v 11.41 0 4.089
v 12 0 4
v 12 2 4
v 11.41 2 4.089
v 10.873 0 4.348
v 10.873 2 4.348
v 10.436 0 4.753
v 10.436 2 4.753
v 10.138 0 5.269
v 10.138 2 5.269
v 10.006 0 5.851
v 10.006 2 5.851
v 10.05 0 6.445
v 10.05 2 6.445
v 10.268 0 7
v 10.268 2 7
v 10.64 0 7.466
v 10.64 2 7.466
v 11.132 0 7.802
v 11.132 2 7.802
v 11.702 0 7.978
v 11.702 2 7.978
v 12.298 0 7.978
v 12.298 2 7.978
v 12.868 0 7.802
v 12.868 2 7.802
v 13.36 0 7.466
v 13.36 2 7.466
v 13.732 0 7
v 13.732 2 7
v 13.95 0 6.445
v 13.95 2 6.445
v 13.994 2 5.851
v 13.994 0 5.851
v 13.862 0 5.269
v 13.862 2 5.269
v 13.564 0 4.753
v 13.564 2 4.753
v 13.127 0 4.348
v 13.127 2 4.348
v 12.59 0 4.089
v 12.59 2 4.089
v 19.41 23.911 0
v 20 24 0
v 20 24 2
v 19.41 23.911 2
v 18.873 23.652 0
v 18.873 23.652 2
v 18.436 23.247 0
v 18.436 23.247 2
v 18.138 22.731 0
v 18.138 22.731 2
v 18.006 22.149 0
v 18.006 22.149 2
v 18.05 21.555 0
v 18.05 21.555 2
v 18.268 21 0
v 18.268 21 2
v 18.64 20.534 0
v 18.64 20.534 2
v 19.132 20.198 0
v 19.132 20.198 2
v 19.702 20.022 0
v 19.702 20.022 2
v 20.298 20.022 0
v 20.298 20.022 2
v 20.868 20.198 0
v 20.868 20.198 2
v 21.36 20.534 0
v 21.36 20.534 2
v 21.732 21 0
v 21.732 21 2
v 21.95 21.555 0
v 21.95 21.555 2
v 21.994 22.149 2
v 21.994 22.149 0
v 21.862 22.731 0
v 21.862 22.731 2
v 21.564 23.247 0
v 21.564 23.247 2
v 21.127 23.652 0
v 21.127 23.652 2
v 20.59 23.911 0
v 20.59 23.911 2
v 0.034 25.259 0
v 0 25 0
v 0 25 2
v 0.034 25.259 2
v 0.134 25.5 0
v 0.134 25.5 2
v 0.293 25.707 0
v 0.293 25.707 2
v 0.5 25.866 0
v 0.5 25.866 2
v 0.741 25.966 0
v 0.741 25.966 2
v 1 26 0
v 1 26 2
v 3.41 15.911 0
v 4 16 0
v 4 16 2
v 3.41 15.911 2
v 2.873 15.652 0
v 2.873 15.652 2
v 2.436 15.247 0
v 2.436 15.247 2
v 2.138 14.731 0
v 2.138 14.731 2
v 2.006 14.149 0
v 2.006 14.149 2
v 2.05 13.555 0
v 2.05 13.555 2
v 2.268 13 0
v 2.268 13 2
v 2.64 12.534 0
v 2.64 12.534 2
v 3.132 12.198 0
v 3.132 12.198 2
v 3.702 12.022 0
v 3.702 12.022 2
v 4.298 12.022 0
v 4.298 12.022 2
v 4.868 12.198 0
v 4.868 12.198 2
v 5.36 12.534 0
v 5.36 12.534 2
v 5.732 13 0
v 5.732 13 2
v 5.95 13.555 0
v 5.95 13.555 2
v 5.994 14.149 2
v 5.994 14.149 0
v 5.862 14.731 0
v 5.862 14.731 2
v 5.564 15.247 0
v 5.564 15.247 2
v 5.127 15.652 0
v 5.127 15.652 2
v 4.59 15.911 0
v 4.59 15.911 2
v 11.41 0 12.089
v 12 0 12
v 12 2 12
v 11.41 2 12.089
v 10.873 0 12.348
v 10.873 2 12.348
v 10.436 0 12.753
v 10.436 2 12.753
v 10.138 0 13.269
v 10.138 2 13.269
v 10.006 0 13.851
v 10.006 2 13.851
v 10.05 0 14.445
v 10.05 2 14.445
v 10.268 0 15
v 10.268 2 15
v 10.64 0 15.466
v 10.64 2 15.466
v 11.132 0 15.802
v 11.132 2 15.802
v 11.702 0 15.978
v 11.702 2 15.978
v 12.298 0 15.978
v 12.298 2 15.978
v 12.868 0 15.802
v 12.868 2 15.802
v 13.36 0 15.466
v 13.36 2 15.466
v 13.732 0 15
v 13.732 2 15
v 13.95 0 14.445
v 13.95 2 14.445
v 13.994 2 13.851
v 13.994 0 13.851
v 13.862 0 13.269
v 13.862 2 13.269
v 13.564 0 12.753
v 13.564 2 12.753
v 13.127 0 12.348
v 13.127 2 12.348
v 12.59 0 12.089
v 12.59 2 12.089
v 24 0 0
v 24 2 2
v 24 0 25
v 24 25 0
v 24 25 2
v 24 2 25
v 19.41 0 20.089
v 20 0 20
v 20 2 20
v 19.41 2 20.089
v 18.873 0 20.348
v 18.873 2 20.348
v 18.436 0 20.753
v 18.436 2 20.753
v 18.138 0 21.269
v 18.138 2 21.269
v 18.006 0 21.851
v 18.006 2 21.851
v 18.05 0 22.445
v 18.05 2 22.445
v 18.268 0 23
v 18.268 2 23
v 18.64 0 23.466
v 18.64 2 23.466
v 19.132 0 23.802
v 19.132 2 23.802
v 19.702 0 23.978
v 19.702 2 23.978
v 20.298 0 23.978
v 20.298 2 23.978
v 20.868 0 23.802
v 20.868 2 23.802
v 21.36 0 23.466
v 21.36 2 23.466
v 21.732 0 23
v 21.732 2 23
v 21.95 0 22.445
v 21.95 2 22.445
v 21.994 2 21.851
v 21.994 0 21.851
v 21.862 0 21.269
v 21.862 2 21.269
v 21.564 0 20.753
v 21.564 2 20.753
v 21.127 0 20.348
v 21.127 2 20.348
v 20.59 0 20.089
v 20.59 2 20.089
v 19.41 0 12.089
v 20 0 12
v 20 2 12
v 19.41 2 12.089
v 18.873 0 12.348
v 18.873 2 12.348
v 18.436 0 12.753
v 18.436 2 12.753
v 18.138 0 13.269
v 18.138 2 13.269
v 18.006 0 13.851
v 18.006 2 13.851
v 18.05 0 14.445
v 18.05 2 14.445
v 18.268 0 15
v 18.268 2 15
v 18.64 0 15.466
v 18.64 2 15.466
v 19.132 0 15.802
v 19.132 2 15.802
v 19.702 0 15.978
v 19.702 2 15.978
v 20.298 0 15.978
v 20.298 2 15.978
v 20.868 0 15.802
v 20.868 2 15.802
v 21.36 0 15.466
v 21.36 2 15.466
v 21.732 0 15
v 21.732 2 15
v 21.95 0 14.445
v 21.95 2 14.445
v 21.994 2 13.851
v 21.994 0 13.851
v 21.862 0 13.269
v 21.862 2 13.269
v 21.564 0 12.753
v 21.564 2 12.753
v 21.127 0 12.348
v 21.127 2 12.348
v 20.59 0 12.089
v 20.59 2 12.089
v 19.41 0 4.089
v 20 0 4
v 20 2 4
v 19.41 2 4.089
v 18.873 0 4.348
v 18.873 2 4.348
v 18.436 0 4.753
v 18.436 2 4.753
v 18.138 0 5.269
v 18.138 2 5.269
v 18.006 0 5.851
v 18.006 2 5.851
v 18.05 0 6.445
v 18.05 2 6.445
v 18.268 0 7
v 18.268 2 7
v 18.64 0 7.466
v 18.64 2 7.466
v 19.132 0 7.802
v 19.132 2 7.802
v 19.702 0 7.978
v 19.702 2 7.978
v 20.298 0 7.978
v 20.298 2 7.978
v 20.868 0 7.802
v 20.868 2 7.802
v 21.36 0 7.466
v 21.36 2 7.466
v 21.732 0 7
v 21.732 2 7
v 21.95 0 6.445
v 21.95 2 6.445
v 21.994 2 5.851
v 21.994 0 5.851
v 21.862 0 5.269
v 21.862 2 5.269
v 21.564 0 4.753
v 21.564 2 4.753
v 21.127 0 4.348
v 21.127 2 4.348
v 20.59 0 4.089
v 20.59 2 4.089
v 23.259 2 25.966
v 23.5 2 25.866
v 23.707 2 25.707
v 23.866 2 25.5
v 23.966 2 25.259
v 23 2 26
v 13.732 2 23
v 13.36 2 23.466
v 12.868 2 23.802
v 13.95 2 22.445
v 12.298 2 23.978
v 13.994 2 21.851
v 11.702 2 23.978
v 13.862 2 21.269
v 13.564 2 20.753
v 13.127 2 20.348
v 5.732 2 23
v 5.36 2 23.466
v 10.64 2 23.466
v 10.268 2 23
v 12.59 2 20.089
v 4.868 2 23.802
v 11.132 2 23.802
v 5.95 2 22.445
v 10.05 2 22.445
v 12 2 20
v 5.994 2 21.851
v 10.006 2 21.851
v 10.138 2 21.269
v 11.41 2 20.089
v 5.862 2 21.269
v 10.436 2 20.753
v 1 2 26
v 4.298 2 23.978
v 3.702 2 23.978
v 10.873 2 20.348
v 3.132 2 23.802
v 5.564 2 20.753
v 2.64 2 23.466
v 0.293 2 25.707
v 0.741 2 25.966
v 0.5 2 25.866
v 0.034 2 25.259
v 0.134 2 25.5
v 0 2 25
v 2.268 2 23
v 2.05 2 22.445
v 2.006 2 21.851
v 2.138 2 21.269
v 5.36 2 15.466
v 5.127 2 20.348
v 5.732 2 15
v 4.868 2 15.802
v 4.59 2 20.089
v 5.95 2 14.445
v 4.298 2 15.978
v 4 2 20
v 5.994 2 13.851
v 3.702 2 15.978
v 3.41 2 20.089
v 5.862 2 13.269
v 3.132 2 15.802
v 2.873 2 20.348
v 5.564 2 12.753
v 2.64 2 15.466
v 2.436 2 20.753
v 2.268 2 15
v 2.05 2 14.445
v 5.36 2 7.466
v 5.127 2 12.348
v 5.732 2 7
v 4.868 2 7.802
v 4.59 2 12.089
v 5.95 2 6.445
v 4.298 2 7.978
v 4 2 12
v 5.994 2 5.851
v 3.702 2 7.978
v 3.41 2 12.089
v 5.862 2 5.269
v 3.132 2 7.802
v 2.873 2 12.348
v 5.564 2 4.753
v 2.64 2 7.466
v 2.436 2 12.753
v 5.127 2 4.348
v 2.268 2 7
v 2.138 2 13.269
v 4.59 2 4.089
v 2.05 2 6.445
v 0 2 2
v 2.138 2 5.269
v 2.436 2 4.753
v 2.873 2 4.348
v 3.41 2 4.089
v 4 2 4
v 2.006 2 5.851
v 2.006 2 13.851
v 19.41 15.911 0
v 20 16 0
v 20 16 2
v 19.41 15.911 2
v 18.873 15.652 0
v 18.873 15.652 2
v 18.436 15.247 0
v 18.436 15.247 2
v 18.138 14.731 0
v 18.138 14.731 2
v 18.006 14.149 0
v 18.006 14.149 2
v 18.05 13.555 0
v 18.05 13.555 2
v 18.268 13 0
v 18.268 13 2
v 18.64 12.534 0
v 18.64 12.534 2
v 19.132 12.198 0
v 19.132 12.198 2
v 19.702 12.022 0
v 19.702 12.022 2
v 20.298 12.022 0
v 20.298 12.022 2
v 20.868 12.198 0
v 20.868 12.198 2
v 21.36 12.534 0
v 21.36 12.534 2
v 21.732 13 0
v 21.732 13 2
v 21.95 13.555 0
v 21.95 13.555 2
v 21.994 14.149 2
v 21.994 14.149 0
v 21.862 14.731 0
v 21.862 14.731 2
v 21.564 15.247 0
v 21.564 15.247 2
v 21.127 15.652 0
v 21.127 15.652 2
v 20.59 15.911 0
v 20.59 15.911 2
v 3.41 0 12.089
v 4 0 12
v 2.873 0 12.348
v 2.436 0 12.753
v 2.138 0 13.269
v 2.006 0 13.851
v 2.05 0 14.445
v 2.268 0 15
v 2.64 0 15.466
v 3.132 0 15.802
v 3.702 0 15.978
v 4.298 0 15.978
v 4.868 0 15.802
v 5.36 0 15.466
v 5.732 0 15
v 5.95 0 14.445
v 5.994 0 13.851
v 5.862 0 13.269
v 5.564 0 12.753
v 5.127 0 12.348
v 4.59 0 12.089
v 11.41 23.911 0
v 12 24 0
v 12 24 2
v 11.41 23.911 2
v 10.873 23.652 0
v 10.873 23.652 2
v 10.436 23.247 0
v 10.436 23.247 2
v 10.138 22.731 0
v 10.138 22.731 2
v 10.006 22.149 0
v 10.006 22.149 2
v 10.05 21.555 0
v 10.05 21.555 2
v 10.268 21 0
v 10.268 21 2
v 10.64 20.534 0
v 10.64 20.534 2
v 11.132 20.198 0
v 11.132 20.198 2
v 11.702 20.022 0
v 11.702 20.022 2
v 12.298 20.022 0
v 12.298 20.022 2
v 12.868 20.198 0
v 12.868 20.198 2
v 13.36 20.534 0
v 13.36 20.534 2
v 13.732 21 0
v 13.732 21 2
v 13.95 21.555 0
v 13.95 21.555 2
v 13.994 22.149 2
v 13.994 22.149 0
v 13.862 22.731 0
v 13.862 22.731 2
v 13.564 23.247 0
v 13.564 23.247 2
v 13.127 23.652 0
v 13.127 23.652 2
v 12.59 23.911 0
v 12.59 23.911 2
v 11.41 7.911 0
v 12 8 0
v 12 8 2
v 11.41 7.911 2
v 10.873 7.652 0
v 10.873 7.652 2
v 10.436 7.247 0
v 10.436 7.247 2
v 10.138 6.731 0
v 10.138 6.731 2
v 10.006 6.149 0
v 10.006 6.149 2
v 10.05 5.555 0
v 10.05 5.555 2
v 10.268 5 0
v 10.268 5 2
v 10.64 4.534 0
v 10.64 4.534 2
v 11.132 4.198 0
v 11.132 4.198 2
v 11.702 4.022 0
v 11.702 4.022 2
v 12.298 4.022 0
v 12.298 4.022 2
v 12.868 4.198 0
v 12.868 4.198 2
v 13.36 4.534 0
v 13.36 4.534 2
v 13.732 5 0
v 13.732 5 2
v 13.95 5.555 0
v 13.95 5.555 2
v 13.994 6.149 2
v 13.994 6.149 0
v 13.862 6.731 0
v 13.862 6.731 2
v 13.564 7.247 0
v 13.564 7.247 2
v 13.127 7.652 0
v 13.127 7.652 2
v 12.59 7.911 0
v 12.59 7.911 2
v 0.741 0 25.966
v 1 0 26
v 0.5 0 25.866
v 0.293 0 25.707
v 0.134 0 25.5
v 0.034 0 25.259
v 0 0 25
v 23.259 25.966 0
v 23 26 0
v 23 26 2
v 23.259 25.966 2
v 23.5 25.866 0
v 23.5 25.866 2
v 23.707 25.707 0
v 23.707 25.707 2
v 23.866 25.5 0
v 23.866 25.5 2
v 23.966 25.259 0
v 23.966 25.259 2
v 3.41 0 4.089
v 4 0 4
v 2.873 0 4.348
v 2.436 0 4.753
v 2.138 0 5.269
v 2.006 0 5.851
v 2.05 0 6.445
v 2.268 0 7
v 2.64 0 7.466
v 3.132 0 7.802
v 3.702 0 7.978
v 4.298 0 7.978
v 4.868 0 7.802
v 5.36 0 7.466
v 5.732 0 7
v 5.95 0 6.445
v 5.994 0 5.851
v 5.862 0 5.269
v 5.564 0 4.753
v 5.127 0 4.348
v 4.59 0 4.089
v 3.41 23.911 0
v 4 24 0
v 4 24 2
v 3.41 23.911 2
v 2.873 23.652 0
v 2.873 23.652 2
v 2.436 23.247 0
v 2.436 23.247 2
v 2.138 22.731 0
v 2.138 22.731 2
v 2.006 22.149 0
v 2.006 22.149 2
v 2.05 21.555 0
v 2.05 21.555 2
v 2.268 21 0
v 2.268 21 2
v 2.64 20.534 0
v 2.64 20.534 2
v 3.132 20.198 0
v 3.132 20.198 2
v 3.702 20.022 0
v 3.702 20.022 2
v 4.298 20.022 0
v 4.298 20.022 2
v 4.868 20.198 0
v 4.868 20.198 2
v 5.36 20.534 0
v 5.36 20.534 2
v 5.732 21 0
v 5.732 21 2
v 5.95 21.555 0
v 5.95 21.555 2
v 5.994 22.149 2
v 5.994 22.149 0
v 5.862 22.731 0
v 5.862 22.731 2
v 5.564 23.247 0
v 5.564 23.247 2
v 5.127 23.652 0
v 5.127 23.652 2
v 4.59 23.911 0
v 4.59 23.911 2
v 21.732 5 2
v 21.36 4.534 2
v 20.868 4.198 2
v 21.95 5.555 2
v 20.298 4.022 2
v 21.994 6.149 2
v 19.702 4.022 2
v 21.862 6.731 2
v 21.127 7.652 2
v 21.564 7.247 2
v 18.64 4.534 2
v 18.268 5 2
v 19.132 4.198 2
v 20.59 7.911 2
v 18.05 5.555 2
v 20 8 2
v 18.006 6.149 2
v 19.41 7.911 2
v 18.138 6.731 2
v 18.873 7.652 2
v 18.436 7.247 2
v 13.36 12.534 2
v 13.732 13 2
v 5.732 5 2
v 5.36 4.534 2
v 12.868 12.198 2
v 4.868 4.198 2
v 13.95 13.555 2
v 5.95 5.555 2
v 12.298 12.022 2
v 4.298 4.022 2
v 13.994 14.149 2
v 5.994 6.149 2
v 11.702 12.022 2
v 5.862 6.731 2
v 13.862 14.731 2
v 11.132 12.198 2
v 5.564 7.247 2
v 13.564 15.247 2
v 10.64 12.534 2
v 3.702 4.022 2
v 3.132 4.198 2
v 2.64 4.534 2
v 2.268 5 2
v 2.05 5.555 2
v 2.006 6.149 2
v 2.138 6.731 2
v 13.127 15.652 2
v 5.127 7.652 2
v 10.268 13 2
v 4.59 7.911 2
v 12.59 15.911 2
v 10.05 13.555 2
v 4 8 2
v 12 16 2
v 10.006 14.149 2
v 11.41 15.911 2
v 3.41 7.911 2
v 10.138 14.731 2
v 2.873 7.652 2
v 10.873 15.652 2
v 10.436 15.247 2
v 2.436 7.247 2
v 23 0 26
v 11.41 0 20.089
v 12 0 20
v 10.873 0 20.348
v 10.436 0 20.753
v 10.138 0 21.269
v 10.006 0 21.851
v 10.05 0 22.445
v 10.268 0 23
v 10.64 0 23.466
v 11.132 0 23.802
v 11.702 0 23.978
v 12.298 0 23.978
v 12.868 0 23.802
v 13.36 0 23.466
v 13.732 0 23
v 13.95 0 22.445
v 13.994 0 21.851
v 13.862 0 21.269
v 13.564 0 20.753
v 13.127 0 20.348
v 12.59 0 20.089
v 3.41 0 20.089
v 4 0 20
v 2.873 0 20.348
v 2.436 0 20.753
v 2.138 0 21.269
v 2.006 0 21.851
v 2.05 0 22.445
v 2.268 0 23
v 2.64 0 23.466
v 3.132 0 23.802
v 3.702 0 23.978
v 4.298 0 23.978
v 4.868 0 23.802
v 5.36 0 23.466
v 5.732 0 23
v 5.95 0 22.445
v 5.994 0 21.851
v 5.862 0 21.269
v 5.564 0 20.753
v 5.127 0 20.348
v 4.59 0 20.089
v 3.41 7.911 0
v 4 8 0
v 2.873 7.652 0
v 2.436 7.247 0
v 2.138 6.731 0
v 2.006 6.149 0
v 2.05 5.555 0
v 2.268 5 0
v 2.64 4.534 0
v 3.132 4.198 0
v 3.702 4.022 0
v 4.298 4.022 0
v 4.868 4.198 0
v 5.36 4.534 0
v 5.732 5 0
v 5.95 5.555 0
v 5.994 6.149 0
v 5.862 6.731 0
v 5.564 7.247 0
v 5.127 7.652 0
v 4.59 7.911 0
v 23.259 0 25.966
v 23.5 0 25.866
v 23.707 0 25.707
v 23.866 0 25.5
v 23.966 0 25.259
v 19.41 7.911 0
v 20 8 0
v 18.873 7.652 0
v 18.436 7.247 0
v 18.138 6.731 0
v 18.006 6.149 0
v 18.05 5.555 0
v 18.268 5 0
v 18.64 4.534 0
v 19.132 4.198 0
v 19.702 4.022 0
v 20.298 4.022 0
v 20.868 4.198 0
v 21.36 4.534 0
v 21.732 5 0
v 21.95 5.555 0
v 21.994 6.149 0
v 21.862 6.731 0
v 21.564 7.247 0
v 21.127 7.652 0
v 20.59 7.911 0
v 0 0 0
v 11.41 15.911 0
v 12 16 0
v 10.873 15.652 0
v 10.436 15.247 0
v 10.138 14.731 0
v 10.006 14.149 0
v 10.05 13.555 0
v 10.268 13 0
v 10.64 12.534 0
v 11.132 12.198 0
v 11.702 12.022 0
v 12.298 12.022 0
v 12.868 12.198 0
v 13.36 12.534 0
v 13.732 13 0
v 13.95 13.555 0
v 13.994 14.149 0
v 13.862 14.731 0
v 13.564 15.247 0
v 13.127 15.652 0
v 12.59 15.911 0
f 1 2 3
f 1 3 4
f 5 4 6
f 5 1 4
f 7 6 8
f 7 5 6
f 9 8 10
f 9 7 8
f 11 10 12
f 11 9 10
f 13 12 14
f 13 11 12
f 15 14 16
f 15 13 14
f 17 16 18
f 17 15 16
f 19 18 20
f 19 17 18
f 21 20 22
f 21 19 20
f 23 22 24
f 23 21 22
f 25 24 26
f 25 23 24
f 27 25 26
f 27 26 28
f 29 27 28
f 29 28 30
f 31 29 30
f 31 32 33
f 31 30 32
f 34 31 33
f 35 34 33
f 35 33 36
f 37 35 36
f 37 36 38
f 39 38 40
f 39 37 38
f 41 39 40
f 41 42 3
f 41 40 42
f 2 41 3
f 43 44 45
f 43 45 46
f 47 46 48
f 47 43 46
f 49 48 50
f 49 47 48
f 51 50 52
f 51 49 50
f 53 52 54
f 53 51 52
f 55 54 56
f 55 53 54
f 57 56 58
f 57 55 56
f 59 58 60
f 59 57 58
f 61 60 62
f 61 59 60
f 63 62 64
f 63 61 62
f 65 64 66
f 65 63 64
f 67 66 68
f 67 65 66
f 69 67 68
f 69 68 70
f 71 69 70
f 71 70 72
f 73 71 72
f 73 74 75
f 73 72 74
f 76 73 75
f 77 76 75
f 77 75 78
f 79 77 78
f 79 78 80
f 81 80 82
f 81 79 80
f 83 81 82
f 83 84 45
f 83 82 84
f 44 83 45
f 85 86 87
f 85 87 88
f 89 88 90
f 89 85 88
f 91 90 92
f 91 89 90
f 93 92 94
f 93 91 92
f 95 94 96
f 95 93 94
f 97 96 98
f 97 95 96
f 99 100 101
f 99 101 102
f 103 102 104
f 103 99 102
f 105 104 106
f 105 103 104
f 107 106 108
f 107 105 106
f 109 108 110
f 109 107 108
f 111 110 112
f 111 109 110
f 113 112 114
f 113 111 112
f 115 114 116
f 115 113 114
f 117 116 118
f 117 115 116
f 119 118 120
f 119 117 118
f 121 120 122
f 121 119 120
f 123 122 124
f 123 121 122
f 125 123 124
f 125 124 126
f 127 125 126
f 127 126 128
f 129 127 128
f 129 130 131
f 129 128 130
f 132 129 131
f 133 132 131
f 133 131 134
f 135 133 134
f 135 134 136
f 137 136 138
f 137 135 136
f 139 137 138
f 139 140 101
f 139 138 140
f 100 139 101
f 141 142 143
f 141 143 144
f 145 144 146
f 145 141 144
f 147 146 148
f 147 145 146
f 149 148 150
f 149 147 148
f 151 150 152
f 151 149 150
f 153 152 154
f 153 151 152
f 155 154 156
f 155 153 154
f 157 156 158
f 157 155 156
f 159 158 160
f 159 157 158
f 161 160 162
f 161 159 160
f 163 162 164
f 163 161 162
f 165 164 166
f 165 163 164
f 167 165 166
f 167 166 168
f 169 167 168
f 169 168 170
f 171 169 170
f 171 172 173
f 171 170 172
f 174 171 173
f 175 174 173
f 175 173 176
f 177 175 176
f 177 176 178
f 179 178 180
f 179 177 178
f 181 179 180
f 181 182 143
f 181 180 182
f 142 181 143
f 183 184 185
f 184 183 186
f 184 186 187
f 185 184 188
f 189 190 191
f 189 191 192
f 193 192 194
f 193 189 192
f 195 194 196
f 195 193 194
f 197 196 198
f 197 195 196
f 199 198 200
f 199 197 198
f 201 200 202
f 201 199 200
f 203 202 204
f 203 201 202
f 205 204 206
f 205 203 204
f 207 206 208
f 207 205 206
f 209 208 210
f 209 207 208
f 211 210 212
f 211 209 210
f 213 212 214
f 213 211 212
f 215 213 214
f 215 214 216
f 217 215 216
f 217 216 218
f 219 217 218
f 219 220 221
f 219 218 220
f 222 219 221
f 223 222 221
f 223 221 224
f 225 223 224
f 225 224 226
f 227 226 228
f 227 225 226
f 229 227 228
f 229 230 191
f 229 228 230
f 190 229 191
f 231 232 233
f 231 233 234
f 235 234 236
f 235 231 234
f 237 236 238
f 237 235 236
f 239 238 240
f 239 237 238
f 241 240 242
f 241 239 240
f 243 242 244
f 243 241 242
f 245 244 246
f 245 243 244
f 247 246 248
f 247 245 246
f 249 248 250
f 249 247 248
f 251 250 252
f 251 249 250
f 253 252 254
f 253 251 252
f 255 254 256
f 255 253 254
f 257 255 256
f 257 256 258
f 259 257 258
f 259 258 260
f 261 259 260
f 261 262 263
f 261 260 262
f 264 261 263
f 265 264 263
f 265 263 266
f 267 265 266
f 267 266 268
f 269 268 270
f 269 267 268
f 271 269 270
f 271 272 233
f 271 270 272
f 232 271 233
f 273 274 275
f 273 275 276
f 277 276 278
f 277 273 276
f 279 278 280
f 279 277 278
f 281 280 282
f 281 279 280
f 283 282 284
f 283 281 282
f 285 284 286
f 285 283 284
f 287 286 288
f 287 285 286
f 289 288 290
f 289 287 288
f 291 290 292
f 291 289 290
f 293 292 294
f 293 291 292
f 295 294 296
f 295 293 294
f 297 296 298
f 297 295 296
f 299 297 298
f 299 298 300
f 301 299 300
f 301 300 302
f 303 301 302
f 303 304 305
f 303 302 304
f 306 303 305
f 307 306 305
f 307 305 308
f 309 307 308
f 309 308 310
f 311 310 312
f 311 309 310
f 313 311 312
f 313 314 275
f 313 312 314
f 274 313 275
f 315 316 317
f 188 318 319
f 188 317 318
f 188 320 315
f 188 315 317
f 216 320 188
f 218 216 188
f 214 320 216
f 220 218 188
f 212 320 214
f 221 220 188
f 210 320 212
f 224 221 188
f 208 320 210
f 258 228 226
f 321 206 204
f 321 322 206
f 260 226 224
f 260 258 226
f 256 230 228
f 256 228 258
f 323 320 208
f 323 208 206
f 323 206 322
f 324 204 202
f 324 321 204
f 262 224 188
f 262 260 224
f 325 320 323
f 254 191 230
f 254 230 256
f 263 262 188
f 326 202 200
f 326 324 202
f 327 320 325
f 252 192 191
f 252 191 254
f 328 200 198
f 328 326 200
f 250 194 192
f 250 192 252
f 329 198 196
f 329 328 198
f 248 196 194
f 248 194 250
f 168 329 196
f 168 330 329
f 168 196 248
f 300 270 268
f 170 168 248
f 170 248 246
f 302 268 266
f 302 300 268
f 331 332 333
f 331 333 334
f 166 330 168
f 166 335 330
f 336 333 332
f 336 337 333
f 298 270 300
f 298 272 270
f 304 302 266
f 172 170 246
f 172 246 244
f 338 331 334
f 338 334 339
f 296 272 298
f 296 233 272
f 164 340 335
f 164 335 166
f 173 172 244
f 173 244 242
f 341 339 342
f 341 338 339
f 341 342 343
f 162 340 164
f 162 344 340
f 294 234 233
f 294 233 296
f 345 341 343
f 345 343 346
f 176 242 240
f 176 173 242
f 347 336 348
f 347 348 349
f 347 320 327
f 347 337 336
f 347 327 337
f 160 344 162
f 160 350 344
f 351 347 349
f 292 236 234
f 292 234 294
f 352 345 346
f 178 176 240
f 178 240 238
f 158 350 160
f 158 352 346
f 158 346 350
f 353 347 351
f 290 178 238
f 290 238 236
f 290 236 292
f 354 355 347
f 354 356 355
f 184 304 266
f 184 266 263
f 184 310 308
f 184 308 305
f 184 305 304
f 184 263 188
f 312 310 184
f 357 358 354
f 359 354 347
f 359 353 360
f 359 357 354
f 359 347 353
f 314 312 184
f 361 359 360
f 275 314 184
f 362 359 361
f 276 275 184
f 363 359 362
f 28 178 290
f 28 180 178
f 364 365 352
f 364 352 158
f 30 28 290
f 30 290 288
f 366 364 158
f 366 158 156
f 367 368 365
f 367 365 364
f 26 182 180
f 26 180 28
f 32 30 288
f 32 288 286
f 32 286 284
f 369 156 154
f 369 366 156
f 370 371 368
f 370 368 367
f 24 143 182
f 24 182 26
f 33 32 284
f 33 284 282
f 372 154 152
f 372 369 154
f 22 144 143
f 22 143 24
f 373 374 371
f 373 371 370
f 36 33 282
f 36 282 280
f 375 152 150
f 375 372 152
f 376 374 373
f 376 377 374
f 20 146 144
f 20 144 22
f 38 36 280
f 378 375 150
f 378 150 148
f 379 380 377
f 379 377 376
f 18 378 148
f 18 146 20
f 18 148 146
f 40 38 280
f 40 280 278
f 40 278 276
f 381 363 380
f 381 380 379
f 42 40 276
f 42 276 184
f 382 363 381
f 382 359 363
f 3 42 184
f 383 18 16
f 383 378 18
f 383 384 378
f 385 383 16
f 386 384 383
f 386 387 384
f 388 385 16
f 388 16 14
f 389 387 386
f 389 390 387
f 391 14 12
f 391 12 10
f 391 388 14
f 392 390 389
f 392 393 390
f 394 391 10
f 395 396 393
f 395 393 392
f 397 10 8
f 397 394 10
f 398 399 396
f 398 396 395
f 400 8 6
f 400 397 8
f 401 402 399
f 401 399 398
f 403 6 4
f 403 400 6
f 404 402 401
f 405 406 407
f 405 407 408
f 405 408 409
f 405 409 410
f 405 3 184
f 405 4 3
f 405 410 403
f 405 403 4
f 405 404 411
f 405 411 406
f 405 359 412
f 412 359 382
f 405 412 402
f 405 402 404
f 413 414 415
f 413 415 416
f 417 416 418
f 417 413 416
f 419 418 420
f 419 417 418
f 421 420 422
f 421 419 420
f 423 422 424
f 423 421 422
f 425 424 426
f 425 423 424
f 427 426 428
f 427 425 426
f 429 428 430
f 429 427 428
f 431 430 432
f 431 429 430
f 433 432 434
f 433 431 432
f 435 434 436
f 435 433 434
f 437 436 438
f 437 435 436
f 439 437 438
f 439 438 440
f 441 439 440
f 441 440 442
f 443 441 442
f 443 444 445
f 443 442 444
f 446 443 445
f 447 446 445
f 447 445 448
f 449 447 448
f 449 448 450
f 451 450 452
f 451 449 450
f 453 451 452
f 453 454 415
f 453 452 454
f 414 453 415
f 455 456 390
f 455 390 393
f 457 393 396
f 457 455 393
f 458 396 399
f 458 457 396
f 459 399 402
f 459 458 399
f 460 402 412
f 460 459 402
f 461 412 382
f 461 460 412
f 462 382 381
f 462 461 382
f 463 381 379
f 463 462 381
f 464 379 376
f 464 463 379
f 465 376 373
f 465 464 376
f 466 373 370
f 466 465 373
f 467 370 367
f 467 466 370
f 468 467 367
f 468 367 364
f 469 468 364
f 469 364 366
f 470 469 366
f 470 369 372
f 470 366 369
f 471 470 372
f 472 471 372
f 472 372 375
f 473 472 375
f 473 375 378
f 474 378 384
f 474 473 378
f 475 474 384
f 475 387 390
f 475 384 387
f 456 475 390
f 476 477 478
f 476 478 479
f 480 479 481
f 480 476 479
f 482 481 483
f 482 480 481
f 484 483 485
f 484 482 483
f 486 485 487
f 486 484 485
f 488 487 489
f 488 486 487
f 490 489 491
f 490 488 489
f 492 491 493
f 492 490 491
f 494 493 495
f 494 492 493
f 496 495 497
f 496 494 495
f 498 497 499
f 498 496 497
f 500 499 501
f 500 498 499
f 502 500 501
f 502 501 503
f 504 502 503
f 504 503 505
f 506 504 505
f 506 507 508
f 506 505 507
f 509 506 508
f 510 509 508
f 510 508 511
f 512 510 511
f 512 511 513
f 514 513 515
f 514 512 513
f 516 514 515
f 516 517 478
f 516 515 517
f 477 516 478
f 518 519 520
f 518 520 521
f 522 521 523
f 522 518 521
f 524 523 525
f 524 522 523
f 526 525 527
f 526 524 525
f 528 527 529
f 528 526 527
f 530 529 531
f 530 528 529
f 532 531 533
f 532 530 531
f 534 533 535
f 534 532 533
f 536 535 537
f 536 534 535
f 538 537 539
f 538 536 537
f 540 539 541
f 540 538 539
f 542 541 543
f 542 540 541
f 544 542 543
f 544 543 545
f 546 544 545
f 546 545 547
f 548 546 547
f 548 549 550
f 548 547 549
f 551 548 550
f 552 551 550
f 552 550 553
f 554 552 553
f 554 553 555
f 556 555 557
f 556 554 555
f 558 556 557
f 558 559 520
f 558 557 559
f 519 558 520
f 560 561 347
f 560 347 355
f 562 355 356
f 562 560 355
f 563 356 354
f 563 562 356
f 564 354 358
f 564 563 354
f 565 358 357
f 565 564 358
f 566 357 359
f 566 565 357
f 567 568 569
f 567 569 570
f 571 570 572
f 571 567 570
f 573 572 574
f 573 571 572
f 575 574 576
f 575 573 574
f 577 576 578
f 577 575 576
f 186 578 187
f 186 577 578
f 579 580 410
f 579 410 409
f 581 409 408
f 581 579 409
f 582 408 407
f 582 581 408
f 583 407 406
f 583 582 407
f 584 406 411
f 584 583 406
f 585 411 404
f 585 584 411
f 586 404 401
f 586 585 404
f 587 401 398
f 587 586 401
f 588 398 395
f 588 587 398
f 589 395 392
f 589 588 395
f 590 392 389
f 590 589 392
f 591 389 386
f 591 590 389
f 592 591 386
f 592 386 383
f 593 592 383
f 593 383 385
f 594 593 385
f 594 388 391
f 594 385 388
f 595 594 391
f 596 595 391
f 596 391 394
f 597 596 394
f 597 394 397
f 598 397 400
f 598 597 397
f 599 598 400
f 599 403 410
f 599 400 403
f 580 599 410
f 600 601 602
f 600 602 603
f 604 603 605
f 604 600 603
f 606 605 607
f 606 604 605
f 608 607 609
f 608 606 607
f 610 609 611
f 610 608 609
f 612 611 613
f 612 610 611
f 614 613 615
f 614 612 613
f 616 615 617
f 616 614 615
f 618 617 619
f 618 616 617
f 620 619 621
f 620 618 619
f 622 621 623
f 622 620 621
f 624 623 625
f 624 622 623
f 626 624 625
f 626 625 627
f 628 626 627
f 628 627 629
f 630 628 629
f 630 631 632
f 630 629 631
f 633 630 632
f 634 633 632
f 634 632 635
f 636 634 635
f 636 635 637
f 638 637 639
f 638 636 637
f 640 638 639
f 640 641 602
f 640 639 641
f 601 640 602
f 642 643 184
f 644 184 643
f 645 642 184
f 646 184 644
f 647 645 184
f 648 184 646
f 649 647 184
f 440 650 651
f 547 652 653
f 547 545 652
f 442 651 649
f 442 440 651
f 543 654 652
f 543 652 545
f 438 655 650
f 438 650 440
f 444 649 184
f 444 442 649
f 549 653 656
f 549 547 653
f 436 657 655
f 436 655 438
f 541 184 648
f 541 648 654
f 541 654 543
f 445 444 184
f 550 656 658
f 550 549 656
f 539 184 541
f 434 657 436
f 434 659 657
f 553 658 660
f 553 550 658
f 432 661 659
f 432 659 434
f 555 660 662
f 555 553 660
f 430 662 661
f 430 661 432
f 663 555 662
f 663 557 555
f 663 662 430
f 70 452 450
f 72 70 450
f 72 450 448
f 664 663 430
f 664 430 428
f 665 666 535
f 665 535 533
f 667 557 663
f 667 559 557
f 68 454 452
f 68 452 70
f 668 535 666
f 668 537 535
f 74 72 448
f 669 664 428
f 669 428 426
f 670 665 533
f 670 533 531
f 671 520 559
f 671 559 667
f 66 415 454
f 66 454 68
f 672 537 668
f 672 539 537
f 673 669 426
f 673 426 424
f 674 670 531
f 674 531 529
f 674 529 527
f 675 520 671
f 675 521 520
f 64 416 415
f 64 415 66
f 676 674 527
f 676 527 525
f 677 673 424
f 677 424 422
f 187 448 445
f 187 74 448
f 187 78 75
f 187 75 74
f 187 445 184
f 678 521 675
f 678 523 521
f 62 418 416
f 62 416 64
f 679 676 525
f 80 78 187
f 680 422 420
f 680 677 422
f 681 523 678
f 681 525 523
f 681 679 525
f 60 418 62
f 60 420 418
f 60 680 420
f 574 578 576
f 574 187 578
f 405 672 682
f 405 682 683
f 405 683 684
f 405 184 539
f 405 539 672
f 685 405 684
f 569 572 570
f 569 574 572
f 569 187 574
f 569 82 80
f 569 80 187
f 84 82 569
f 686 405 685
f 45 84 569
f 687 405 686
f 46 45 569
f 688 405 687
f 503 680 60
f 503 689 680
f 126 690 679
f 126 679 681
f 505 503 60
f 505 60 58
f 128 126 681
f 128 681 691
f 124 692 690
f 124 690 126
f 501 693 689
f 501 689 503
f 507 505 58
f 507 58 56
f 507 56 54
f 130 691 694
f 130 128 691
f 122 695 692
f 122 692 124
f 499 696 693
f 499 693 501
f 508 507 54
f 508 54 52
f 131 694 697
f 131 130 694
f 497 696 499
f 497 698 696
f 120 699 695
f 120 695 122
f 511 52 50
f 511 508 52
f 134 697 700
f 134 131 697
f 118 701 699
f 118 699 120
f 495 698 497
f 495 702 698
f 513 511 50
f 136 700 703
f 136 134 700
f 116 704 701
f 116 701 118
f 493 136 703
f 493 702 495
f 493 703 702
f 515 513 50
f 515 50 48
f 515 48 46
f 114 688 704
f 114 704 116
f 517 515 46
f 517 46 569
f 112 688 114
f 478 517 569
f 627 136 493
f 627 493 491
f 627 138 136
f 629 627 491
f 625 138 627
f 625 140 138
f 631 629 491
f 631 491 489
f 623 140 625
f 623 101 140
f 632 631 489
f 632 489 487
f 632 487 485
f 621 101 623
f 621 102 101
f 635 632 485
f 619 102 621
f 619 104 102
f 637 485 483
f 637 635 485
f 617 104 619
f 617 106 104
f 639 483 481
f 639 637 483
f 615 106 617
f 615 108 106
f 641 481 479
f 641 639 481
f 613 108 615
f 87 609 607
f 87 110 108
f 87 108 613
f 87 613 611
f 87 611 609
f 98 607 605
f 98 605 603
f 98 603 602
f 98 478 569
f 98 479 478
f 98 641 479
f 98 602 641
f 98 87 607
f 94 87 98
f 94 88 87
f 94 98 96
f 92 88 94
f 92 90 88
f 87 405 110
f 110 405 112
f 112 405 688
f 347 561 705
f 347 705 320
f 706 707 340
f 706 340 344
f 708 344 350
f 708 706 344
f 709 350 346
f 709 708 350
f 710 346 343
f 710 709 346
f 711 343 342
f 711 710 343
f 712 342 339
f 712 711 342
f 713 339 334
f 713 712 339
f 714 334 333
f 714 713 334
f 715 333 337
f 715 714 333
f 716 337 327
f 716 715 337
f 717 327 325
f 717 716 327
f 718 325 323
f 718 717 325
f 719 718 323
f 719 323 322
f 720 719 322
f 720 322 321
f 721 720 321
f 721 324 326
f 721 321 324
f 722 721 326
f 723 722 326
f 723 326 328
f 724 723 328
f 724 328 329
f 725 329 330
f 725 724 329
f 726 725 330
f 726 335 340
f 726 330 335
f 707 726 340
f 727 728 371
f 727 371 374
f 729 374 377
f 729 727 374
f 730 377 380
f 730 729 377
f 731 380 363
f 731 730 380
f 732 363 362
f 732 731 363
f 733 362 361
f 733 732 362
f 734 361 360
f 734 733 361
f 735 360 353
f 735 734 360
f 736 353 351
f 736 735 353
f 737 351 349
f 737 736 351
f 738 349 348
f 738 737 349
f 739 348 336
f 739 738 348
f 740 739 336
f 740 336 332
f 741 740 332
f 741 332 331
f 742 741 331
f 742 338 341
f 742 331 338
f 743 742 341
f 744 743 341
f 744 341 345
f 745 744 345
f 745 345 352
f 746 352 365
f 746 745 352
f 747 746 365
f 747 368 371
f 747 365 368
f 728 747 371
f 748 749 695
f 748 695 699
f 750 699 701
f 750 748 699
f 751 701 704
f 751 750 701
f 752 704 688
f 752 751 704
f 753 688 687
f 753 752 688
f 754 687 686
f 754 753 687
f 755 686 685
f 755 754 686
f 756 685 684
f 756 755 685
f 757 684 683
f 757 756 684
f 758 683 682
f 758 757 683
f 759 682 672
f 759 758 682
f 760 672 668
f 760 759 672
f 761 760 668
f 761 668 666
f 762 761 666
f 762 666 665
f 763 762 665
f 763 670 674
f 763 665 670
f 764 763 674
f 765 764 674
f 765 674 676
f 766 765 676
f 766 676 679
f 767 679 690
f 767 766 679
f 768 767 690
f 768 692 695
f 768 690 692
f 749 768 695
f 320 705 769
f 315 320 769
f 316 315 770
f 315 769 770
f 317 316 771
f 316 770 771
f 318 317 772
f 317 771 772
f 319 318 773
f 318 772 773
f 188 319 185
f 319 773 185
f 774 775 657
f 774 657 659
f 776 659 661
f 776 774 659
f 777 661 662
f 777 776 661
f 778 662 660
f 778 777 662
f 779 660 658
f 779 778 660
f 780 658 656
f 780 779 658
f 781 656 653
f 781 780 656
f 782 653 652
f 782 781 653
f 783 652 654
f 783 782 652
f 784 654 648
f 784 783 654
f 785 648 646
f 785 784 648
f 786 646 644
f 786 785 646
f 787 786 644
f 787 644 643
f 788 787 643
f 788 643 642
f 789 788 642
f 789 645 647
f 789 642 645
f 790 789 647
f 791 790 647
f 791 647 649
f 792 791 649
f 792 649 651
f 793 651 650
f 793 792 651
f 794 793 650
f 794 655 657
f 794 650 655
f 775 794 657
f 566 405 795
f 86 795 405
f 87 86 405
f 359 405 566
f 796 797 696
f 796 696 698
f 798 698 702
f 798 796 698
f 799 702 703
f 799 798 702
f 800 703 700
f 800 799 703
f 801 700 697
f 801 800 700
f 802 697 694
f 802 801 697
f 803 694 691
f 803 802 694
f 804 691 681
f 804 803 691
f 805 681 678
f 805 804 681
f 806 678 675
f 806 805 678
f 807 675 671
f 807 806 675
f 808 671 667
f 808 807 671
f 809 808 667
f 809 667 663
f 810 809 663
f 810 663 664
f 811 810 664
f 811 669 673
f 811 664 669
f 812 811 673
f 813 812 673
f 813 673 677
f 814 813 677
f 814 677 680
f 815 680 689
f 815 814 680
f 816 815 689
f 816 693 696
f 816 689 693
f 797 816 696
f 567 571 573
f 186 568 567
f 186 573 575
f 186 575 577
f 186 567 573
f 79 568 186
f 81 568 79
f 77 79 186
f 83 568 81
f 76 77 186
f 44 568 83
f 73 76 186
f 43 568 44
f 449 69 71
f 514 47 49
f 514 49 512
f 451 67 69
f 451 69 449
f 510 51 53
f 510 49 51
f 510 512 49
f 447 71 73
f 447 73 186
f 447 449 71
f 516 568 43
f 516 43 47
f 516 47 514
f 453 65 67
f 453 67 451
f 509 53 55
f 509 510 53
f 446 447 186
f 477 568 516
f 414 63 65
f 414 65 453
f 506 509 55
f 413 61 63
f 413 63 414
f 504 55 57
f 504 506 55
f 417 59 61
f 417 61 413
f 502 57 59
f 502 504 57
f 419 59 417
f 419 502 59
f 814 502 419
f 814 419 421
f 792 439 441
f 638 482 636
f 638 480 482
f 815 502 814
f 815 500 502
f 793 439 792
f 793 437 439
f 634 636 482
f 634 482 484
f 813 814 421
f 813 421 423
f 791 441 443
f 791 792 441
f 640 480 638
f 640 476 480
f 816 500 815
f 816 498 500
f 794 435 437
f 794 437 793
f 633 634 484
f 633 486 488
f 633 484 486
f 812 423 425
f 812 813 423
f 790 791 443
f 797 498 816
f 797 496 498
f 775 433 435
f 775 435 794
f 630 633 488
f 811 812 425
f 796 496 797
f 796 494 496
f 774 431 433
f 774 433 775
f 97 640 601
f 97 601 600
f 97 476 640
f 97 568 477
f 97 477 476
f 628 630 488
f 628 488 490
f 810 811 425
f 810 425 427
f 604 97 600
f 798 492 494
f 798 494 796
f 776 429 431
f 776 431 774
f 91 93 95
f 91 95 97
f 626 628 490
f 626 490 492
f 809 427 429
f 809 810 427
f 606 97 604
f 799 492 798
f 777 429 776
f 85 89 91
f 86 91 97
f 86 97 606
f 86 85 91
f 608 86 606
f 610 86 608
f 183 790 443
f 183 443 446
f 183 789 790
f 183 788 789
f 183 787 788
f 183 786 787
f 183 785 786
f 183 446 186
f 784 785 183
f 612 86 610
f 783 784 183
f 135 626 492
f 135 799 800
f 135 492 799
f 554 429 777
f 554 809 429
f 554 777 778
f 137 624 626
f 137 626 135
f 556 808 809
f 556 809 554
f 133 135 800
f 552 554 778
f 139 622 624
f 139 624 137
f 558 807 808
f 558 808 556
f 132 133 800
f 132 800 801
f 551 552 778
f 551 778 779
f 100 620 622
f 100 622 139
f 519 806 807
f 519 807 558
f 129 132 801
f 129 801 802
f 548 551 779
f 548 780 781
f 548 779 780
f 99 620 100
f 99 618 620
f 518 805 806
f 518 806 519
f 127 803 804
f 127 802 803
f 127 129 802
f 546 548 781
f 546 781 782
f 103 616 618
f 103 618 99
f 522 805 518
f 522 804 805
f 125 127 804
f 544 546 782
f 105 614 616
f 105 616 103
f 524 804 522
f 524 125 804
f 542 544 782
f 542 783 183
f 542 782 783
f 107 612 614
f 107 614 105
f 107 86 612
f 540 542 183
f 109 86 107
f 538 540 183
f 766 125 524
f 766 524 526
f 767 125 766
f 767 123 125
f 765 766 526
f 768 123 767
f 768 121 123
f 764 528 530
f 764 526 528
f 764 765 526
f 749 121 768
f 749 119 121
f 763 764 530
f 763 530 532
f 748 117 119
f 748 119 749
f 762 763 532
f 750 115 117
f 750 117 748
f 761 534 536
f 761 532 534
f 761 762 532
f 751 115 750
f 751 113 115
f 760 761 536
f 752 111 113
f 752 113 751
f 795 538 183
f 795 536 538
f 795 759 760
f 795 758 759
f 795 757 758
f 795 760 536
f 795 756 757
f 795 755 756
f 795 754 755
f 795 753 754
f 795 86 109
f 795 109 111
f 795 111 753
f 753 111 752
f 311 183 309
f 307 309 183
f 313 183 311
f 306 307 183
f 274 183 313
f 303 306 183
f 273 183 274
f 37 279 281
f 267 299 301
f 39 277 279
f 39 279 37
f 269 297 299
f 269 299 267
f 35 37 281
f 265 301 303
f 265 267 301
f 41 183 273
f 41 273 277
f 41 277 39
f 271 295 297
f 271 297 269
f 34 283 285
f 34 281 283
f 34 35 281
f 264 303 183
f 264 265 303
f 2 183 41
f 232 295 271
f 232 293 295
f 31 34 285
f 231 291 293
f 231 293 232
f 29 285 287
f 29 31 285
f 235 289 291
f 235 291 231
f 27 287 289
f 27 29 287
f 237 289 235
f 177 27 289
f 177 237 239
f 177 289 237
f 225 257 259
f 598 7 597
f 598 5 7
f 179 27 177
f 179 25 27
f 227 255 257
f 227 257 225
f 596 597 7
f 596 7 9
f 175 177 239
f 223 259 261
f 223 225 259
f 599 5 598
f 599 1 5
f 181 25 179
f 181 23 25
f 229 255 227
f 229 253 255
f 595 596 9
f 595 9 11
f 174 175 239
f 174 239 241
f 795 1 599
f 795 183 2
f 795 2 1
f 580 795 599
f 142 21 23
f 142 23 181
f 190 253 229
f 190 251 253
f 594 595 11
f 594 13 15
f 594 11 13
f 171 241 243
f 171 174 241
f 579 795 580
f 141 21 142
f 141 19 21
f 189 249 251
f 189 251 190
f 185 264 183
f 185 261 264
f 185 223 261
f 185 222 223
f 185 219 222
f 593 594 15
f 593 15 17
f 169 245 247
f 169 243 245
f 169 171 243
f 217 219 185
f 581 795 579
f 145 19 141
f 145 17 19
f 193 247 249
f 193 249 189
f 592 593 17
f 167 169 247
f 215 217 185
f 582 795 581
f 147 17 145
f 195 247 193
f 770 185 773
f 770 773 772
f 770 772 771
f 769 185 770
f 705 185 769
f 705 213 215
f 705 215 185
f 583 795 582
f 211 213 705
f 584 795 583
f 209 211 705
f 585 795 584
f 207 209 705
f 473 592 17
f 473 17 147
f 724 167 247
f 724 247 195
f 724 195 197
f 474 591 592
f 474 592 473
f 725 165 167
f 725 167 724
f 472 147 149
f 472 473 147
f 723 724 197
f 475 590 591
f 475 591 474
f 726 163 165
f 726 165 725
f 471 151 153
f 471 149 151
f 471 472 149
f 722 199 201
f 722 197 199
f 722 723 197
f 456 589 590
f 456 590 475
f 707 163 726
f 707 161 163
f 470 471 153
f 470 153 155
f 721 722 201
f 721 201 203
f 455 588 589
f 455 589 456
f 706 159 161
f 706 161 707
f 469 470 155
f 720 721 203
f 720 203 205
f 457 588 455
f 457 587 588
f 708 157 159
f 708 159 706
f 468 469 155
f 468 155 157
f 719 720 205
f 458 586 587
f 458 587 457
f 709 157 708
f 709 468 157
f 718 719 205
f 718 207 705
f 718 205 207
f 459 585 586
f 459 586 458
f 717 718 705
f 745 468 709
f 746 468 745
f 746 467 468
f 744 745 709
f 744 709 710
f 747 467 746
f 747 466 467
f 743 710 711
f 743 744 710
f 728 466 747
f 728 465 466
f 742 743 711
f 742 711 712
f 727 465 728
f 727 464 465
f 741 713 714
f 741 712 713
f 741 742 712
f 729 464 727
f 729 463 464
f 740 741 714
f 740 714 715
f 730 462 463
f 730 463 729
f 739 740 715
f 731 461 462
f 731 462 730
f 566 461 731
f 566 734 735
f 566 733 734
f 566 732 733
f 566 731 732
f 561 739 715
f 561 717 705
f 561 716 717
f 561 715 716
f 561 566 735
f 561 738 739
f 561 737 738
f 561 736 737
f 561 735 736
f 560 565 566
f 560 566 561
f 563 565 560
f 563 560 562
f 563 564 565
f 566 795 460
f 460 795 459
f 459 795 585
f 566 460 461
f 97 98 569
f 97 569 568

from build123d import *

# Parameters (mm, degrees)
EXTRUDE_1_DEPTH          = 24
CUT_EXTRUDE_1_DEPTH      = 24
CUT_EXTRUDE_1_DEPTH_BACK = 24
SKETCH_2_R               = 2
CUT_EXTRUDE_2_DEPTH      = 24
CUT_EXTRUDE_2_DEPTH_BACK = 24
SKETCH_3_R               = 2


with BuildPart() as part:
    # Эскиз1 → Бобышка-Вытянуть1 (new body)
    with BuildSketch(Plane(origin=(0, 0, 0), x_dir=(0, 0, -1), z_dir=(1, 0, 0))):
        Polygon((0, 0), (-26, 0), (-26, 2), (-2, 2), (-2, 26), (0, 26), align=None)
    extrude(amount=EXTRUDE_1_DEPTH)

    # Эскиз2 → Вырез-Вытянуть1 (cut, two sides: drawn at the far end of the back side and taken through both)
    with BuildSketch(Plane.XY.offset(-CUT_EXTRUDE_1_DEPTH_BACK)):
        with Locations(Location((12, 14, 0), (0, 0, 90))):
            Circle(SKETCH_2_R)
        with Locations(Location((4, 14, 0), (0, 0, 90))):
            Circle(SKETCH_2_R)
        with Locations(Location((20, 14, 0), (0, 0, 90))):
            Circle(SKETCH_2_R)
        with Locations(Location((12, 22, 0), (0, 0, 90))):
            Circle(SKETCH_2_R)
        with Locations(Location((4, 22, 0), (0, 0, 90))):
            Circle(SKETCH_2_R)
        with Locations(Location((20, 22, 0), (0, 0, 90))):
            Circle(SKETCH_2_R)
        with Locations(Location((12, 6, 0), (0, 0, 90))):
            Circle(SKETCH_2_R)
        with Locations(Location((4, 6, 0), (0, 0, 90))):
            Circle(SKETCH_2_R)
        with Locations(Location((20, 6, 0), (0, 0, 90))):
            Circle(SKETCH_2_R)
        with BuildLine():
            Line((0, 26), (0, 25))
            ThreePointArc((0, 25), (0.292893219, 25.707106781), (1, 26))
            Line((1, 26), (0, 26))
        make_face()
        with BuildLine():
            Line((24, 26), (23, 26))
            ThreePointArc((23, 26), (23.707106781, 25.707106781), (24, 25))
            Line((24, 25), (24, 26))
        make_face()
    extrude(amount=CUT_EXTRUDE_1_DEPTH + CUT_EXTRUDE_1_DEPTH_BACK, mode=Mode.SUBTRACT)

    # Эскиз3 → Вырез-Вытянуть2 (cut, two sides: drawn at the far end of the back side and taken through both)
    with BuildSketch(Plane(origin=(0, 0, 0), x_dir=(1, 0, 0), z_dir=(0, 1, 0)).offset(-CUT_EXTRUDE_2_DEPTH_BACK)):
        with Locations(Location((12, -14, 0), (0, 0, 90))):
            Circle(SKETCH_3_R)
        with Locations(Location((4, -14, 0), (0, 0, 90))):
            Circle(SKETCH_3_R)
        with Locations(Location((20, -14, 0), (0, 0, 90))):
            Circle(SKETCH_3_R)
        with Locations(Location((12, -6, 0), (0, 0, 90))):
            Circle(SKETCH_3_R)
        with Locations(Location((4, -6, 0), (0, 0, 90))):
            Circle(SKETCH_3_R)
        with Locations(Location((20, -6, 0), (0, 0, 90))):
            Circle(SKETCH_3_R)
        with Locations(Location((12, -22, 0), (0, 0, 90))):
            Circle(SKETCH_3_R)
        with Locations(Location((4, -22, 0), (0, 0, 90))):
            Circle(SKETCH_3_R)
        with Locations(Location((20, -22, 0), (0, 0, 90))):
            Circle(SKETCH_3_R)
        with BuildLine():
            Line((0, -25), (0, -26))
            Line((0, -26), (1, -26))
            ThreePointArc((1, -26), (0.292893219, -25.707106781), (0, -25))
        make_face()
        with BuildLine():
            Line((24, -26), (23, -26))
            ThreePointArc((23, -26), (23.707106781, -25.707106781), (24, -25))
            Line((24, -25), (24, -26))
        make_face()
    extrude(amount=CUT_EXTRUDE_2_DEPTH + CUT_EXTRUDE_2_DEPTH_BACK, mode=Mode.SUBTRACT)


solid = part.part
